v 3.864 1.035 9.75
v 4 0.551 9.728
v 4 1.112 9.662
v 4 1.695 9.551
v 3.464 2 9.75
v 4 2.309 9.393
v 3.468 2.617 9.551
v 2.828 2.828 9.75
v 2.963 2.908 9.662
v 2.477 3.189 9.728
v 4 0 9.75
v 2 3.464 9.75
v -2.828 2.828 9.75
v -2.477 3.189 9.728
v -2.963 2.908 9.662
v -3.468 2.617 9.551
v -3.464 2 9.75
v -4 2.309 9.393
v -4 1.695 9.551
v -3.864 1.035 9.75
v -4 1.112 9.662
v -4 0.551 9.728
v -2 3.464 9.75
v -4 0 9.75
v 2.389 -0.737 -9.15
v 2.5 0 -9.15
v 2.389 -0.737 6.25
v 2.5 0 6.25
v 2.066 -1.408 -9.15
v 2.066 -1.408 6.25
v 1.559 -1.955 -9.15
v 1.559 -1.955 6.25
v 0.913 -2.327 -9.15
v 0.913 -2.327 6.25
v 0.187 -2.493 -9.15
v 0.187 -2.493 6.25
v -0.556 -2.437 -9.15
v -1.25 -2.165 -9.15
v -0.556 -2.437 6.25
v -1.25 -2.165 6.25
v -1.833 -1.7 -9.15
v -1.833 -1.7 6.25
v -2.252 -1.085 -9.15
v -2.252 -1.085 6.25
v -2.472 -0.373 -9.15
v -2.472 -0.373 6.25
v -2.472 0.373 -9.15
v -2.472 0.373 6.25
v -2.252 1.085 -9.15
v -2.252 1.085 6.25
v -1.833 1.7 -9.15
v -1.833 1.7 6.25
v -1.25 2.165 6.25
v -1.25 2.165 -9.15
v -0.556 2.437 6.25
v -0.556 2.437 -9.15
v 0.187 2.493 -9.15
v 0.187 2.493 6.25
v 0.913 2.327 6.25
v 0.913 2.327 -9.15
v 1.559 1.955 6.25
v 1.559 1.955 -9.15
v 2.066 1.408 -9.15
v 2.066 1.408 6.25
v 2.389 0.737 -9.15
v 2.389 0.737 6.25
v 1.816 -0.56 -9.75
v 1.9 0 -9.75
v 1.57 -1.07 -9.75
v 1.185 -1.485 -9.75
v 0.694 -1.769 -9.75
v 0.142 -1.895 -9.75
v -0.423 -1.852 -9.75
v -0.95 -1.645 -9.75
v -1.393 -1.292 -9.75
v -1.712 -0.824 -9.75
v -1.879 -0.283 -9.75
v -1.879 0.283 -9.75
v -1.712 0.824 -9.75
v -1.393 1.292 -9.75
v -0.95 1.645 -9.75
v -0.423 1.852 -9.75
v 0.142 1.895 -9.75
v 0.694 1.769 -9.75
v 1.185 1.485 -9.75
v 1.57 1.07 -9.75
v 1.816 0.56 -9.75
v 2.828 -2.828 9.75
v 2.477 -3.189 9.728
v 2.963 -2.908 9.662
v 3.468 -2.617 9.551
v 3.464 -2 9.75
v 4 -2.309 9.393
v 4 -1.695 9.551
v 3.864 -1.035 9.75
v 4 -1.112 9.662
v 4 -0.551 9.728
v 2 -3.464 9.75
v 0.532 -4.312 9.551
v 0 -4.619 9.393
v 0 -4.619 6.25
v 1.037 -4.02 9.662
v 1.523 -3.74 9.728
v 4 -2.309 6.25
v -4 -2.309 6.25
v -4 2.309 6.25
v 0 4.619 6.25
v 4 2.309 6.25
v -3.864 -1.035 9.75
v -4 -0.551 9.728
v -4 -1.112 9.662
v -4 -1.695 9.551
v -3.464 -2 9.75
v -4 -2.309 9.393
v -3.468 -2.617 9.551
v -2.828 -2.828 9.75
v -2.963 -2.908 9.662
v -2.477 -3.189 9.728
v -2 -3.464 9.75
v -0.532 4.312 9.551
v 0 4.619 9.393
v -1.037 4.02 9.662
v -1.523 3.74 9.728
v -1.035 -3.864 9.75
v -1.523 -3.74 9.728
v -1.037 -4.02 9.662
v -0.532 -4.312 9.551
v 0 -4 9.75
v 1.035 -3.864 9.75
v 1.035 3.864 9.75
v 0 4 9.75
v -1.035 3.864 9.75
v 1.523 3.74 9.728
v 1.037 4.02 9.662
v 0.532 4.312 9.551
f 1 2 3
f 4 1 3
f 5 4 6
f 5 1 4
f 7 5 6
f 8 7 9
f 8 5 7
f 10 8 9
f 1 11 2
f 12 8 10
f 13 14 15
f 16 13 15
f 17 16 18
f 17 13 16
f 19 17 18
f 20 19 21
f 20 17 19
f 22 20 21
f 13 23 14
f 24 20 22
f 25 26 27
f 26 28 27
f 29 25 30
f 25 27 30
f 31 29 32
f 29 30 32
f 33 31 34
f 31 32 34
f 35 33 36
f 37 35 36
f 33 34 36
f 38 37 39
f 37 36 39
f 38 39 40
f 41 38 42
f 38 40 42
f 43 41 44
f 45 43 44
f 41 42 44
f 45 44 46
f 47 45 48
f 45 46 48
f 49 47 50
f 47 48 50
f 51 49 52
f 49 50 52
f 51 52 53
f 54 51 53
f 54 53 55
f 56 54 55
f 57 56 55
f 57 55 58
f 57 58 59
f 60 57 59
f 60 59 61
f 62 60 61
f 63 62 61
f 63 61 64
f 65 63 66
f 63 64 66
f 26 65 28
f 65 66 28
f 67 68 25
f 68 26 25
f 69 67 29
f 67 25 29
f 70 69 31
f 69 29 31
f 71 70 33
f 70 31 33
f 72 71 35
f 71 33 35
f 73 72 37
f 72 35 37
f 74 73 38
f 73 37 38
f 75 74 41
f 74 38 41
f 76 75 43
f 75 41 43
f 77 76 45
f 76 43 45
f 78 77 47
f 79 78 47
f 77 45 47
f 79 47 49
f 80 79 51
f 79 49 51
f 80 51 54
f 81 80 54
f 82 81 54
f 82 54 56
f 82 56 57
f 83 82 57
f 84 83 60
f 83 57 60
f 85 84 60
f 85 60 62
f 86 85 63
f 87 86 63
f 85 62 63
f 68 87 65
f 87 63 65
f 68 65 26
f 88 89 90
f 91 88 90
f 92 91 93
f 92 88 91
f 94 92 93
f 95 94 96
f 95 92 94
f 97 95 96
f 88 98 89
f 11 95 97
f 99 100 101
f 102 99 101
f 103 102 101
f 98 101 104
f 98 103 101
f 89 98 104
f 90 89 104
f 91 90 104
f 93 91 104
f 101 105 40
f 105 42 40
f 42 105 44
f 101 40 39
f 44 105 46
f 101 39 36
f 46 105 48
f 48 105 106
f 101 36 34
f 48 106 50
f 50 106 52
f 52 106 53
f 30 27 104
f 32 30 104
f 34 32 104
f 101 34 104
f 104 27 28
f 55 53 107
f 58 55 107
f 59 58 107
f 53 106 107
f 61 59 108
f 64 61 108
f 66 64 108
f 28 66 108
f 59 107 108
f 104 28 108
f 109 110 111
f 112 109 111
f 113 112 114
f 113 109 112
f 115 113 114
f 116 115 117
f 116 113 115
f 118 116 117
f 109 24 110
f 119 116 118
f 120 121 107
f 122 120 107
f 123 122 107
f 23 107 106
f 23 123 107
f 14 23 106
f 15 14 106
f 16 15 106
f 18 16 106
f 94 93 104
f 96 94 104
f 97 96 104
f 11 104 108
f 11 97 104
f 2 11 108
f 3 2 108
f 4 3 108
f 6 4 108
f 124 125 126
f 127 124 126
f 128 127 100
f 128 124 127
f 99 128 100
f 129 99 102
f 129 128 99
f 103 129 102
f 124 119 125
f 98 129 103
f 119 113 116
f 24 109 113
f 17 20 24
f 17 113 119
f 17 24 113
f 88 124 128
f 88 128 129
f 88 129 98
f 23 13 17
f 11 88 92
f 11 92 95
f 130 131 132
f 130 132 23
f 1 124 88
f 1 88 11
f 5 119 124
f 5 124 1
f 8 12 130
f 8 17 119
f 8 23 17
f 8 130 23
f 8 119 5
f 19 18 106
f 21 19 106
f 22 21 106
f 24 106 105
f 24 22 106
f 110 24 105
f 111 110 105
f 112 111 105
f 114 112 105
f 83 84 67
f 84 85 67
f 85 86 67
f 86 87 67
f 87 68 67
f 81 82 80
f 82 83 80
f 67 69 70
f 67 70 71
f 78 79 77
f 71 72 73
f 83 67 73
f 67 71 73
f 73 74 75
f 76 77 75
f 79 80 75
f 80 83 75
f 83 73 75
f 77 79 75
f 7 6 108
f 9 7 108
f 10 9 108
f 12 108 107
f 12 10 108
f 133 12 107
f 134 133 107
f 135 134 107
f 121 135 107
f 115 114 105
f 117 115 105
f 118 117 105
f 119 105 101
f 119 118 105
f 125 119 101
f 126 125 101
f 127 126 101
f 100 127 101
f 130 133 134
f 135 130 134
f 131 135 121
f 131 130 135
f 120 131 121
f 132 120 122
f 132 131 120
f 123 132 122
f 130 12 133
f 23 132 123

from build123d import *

# Parameters (mm, degrees)
BOSS_EXTRUDE1_DEPTH = 3.5
SKETCH4_OUTSIDE_W   = 88.856
SKETCH4_OUTSIDE_H   = 90.094
SKETCH4_OUTSIDE_R   = 4
CUT_EXTRUDE1_DEPTH  = 21.434855843
CUT_EXTRUDE1_DRAFT  = -60


with BuildPart() as part:
    # Sketch2 → Revolve1 (revolve)
    with BuildSketch(Plane(origin=(0, 0, 0), x_dir=(0, 0, -1), z_dir=(1, 0, 0)), mode=Mode.PRIVATE) as revolve1_sk:
        Polygon((-9.75, 4), (-9.75, 0), (9.75, 0), (9.75, 1.9), (9.15, 2.5), (-6.25, 2.5), (-6.25, 4), align=None)
    revolve(revolve1_sk.sketch.rotate(Axis((0, 0, 9.75), (0, 0, -1)), 90), axis=Axis((0, 0, 9.75), (0, 0, -1)))

    # Sketch3 → Boss-Extrude1 (add)
    with BuildSketch(Plane.XY.offset(9.75)):
        Polygon((0, 4.618802154), (-4, 2.309401077), (-4, -2.309401077), (0, -4.618802154), (4, -2.309401077), (4, 2.309401077), align=None)
    extrude(amount=-BOSS_EXTRUDE1_DEPTH)


with BuildPart() as cut_extrude1_tool:
    # Sketch4 outside → Cut-Extrude1 (with draft: the straight prism first)
    with BuildSketch(Plane.XY.offset(9.75)):
        Rectangle(SKETCH4_OUTSIDE_W, SKETCH4_OUTSIDE_H)
        Circle(SKETCH4_OUTSIDE_R, mode=Mode.SUBTRACT)
    extrude(amount=-CUT_EXTRUDE1_DEPTH)
    # Cut-Extrude1: the draft: its side faces are tilted about the plane it starts from
    cut_extrude1_sides = [cut_extrude1_tool.faces().sort_by_distance(p)[0] for p in [
        (0, -45.047, -0.967427922),
        (44.428, 0, -0.967427922),
        (0, 45.047, -0.967427922),
        (-44.428, 0, -0.967427922),
        (-4, 0, -0.967427922),
    ]]
    draft(cut_extrude1_sides, Plane.XY.offset(9.75), CUT_EXTRUDE1_DRAFT)


with BuildPart() as part_1:
    add(part.part)

    # Cut-Extrude1: cut by cut_extrude1_tool
    add(cut_extrude1_tool.part, mode=Mode.SUBTRACT)


solid = part_1.part
